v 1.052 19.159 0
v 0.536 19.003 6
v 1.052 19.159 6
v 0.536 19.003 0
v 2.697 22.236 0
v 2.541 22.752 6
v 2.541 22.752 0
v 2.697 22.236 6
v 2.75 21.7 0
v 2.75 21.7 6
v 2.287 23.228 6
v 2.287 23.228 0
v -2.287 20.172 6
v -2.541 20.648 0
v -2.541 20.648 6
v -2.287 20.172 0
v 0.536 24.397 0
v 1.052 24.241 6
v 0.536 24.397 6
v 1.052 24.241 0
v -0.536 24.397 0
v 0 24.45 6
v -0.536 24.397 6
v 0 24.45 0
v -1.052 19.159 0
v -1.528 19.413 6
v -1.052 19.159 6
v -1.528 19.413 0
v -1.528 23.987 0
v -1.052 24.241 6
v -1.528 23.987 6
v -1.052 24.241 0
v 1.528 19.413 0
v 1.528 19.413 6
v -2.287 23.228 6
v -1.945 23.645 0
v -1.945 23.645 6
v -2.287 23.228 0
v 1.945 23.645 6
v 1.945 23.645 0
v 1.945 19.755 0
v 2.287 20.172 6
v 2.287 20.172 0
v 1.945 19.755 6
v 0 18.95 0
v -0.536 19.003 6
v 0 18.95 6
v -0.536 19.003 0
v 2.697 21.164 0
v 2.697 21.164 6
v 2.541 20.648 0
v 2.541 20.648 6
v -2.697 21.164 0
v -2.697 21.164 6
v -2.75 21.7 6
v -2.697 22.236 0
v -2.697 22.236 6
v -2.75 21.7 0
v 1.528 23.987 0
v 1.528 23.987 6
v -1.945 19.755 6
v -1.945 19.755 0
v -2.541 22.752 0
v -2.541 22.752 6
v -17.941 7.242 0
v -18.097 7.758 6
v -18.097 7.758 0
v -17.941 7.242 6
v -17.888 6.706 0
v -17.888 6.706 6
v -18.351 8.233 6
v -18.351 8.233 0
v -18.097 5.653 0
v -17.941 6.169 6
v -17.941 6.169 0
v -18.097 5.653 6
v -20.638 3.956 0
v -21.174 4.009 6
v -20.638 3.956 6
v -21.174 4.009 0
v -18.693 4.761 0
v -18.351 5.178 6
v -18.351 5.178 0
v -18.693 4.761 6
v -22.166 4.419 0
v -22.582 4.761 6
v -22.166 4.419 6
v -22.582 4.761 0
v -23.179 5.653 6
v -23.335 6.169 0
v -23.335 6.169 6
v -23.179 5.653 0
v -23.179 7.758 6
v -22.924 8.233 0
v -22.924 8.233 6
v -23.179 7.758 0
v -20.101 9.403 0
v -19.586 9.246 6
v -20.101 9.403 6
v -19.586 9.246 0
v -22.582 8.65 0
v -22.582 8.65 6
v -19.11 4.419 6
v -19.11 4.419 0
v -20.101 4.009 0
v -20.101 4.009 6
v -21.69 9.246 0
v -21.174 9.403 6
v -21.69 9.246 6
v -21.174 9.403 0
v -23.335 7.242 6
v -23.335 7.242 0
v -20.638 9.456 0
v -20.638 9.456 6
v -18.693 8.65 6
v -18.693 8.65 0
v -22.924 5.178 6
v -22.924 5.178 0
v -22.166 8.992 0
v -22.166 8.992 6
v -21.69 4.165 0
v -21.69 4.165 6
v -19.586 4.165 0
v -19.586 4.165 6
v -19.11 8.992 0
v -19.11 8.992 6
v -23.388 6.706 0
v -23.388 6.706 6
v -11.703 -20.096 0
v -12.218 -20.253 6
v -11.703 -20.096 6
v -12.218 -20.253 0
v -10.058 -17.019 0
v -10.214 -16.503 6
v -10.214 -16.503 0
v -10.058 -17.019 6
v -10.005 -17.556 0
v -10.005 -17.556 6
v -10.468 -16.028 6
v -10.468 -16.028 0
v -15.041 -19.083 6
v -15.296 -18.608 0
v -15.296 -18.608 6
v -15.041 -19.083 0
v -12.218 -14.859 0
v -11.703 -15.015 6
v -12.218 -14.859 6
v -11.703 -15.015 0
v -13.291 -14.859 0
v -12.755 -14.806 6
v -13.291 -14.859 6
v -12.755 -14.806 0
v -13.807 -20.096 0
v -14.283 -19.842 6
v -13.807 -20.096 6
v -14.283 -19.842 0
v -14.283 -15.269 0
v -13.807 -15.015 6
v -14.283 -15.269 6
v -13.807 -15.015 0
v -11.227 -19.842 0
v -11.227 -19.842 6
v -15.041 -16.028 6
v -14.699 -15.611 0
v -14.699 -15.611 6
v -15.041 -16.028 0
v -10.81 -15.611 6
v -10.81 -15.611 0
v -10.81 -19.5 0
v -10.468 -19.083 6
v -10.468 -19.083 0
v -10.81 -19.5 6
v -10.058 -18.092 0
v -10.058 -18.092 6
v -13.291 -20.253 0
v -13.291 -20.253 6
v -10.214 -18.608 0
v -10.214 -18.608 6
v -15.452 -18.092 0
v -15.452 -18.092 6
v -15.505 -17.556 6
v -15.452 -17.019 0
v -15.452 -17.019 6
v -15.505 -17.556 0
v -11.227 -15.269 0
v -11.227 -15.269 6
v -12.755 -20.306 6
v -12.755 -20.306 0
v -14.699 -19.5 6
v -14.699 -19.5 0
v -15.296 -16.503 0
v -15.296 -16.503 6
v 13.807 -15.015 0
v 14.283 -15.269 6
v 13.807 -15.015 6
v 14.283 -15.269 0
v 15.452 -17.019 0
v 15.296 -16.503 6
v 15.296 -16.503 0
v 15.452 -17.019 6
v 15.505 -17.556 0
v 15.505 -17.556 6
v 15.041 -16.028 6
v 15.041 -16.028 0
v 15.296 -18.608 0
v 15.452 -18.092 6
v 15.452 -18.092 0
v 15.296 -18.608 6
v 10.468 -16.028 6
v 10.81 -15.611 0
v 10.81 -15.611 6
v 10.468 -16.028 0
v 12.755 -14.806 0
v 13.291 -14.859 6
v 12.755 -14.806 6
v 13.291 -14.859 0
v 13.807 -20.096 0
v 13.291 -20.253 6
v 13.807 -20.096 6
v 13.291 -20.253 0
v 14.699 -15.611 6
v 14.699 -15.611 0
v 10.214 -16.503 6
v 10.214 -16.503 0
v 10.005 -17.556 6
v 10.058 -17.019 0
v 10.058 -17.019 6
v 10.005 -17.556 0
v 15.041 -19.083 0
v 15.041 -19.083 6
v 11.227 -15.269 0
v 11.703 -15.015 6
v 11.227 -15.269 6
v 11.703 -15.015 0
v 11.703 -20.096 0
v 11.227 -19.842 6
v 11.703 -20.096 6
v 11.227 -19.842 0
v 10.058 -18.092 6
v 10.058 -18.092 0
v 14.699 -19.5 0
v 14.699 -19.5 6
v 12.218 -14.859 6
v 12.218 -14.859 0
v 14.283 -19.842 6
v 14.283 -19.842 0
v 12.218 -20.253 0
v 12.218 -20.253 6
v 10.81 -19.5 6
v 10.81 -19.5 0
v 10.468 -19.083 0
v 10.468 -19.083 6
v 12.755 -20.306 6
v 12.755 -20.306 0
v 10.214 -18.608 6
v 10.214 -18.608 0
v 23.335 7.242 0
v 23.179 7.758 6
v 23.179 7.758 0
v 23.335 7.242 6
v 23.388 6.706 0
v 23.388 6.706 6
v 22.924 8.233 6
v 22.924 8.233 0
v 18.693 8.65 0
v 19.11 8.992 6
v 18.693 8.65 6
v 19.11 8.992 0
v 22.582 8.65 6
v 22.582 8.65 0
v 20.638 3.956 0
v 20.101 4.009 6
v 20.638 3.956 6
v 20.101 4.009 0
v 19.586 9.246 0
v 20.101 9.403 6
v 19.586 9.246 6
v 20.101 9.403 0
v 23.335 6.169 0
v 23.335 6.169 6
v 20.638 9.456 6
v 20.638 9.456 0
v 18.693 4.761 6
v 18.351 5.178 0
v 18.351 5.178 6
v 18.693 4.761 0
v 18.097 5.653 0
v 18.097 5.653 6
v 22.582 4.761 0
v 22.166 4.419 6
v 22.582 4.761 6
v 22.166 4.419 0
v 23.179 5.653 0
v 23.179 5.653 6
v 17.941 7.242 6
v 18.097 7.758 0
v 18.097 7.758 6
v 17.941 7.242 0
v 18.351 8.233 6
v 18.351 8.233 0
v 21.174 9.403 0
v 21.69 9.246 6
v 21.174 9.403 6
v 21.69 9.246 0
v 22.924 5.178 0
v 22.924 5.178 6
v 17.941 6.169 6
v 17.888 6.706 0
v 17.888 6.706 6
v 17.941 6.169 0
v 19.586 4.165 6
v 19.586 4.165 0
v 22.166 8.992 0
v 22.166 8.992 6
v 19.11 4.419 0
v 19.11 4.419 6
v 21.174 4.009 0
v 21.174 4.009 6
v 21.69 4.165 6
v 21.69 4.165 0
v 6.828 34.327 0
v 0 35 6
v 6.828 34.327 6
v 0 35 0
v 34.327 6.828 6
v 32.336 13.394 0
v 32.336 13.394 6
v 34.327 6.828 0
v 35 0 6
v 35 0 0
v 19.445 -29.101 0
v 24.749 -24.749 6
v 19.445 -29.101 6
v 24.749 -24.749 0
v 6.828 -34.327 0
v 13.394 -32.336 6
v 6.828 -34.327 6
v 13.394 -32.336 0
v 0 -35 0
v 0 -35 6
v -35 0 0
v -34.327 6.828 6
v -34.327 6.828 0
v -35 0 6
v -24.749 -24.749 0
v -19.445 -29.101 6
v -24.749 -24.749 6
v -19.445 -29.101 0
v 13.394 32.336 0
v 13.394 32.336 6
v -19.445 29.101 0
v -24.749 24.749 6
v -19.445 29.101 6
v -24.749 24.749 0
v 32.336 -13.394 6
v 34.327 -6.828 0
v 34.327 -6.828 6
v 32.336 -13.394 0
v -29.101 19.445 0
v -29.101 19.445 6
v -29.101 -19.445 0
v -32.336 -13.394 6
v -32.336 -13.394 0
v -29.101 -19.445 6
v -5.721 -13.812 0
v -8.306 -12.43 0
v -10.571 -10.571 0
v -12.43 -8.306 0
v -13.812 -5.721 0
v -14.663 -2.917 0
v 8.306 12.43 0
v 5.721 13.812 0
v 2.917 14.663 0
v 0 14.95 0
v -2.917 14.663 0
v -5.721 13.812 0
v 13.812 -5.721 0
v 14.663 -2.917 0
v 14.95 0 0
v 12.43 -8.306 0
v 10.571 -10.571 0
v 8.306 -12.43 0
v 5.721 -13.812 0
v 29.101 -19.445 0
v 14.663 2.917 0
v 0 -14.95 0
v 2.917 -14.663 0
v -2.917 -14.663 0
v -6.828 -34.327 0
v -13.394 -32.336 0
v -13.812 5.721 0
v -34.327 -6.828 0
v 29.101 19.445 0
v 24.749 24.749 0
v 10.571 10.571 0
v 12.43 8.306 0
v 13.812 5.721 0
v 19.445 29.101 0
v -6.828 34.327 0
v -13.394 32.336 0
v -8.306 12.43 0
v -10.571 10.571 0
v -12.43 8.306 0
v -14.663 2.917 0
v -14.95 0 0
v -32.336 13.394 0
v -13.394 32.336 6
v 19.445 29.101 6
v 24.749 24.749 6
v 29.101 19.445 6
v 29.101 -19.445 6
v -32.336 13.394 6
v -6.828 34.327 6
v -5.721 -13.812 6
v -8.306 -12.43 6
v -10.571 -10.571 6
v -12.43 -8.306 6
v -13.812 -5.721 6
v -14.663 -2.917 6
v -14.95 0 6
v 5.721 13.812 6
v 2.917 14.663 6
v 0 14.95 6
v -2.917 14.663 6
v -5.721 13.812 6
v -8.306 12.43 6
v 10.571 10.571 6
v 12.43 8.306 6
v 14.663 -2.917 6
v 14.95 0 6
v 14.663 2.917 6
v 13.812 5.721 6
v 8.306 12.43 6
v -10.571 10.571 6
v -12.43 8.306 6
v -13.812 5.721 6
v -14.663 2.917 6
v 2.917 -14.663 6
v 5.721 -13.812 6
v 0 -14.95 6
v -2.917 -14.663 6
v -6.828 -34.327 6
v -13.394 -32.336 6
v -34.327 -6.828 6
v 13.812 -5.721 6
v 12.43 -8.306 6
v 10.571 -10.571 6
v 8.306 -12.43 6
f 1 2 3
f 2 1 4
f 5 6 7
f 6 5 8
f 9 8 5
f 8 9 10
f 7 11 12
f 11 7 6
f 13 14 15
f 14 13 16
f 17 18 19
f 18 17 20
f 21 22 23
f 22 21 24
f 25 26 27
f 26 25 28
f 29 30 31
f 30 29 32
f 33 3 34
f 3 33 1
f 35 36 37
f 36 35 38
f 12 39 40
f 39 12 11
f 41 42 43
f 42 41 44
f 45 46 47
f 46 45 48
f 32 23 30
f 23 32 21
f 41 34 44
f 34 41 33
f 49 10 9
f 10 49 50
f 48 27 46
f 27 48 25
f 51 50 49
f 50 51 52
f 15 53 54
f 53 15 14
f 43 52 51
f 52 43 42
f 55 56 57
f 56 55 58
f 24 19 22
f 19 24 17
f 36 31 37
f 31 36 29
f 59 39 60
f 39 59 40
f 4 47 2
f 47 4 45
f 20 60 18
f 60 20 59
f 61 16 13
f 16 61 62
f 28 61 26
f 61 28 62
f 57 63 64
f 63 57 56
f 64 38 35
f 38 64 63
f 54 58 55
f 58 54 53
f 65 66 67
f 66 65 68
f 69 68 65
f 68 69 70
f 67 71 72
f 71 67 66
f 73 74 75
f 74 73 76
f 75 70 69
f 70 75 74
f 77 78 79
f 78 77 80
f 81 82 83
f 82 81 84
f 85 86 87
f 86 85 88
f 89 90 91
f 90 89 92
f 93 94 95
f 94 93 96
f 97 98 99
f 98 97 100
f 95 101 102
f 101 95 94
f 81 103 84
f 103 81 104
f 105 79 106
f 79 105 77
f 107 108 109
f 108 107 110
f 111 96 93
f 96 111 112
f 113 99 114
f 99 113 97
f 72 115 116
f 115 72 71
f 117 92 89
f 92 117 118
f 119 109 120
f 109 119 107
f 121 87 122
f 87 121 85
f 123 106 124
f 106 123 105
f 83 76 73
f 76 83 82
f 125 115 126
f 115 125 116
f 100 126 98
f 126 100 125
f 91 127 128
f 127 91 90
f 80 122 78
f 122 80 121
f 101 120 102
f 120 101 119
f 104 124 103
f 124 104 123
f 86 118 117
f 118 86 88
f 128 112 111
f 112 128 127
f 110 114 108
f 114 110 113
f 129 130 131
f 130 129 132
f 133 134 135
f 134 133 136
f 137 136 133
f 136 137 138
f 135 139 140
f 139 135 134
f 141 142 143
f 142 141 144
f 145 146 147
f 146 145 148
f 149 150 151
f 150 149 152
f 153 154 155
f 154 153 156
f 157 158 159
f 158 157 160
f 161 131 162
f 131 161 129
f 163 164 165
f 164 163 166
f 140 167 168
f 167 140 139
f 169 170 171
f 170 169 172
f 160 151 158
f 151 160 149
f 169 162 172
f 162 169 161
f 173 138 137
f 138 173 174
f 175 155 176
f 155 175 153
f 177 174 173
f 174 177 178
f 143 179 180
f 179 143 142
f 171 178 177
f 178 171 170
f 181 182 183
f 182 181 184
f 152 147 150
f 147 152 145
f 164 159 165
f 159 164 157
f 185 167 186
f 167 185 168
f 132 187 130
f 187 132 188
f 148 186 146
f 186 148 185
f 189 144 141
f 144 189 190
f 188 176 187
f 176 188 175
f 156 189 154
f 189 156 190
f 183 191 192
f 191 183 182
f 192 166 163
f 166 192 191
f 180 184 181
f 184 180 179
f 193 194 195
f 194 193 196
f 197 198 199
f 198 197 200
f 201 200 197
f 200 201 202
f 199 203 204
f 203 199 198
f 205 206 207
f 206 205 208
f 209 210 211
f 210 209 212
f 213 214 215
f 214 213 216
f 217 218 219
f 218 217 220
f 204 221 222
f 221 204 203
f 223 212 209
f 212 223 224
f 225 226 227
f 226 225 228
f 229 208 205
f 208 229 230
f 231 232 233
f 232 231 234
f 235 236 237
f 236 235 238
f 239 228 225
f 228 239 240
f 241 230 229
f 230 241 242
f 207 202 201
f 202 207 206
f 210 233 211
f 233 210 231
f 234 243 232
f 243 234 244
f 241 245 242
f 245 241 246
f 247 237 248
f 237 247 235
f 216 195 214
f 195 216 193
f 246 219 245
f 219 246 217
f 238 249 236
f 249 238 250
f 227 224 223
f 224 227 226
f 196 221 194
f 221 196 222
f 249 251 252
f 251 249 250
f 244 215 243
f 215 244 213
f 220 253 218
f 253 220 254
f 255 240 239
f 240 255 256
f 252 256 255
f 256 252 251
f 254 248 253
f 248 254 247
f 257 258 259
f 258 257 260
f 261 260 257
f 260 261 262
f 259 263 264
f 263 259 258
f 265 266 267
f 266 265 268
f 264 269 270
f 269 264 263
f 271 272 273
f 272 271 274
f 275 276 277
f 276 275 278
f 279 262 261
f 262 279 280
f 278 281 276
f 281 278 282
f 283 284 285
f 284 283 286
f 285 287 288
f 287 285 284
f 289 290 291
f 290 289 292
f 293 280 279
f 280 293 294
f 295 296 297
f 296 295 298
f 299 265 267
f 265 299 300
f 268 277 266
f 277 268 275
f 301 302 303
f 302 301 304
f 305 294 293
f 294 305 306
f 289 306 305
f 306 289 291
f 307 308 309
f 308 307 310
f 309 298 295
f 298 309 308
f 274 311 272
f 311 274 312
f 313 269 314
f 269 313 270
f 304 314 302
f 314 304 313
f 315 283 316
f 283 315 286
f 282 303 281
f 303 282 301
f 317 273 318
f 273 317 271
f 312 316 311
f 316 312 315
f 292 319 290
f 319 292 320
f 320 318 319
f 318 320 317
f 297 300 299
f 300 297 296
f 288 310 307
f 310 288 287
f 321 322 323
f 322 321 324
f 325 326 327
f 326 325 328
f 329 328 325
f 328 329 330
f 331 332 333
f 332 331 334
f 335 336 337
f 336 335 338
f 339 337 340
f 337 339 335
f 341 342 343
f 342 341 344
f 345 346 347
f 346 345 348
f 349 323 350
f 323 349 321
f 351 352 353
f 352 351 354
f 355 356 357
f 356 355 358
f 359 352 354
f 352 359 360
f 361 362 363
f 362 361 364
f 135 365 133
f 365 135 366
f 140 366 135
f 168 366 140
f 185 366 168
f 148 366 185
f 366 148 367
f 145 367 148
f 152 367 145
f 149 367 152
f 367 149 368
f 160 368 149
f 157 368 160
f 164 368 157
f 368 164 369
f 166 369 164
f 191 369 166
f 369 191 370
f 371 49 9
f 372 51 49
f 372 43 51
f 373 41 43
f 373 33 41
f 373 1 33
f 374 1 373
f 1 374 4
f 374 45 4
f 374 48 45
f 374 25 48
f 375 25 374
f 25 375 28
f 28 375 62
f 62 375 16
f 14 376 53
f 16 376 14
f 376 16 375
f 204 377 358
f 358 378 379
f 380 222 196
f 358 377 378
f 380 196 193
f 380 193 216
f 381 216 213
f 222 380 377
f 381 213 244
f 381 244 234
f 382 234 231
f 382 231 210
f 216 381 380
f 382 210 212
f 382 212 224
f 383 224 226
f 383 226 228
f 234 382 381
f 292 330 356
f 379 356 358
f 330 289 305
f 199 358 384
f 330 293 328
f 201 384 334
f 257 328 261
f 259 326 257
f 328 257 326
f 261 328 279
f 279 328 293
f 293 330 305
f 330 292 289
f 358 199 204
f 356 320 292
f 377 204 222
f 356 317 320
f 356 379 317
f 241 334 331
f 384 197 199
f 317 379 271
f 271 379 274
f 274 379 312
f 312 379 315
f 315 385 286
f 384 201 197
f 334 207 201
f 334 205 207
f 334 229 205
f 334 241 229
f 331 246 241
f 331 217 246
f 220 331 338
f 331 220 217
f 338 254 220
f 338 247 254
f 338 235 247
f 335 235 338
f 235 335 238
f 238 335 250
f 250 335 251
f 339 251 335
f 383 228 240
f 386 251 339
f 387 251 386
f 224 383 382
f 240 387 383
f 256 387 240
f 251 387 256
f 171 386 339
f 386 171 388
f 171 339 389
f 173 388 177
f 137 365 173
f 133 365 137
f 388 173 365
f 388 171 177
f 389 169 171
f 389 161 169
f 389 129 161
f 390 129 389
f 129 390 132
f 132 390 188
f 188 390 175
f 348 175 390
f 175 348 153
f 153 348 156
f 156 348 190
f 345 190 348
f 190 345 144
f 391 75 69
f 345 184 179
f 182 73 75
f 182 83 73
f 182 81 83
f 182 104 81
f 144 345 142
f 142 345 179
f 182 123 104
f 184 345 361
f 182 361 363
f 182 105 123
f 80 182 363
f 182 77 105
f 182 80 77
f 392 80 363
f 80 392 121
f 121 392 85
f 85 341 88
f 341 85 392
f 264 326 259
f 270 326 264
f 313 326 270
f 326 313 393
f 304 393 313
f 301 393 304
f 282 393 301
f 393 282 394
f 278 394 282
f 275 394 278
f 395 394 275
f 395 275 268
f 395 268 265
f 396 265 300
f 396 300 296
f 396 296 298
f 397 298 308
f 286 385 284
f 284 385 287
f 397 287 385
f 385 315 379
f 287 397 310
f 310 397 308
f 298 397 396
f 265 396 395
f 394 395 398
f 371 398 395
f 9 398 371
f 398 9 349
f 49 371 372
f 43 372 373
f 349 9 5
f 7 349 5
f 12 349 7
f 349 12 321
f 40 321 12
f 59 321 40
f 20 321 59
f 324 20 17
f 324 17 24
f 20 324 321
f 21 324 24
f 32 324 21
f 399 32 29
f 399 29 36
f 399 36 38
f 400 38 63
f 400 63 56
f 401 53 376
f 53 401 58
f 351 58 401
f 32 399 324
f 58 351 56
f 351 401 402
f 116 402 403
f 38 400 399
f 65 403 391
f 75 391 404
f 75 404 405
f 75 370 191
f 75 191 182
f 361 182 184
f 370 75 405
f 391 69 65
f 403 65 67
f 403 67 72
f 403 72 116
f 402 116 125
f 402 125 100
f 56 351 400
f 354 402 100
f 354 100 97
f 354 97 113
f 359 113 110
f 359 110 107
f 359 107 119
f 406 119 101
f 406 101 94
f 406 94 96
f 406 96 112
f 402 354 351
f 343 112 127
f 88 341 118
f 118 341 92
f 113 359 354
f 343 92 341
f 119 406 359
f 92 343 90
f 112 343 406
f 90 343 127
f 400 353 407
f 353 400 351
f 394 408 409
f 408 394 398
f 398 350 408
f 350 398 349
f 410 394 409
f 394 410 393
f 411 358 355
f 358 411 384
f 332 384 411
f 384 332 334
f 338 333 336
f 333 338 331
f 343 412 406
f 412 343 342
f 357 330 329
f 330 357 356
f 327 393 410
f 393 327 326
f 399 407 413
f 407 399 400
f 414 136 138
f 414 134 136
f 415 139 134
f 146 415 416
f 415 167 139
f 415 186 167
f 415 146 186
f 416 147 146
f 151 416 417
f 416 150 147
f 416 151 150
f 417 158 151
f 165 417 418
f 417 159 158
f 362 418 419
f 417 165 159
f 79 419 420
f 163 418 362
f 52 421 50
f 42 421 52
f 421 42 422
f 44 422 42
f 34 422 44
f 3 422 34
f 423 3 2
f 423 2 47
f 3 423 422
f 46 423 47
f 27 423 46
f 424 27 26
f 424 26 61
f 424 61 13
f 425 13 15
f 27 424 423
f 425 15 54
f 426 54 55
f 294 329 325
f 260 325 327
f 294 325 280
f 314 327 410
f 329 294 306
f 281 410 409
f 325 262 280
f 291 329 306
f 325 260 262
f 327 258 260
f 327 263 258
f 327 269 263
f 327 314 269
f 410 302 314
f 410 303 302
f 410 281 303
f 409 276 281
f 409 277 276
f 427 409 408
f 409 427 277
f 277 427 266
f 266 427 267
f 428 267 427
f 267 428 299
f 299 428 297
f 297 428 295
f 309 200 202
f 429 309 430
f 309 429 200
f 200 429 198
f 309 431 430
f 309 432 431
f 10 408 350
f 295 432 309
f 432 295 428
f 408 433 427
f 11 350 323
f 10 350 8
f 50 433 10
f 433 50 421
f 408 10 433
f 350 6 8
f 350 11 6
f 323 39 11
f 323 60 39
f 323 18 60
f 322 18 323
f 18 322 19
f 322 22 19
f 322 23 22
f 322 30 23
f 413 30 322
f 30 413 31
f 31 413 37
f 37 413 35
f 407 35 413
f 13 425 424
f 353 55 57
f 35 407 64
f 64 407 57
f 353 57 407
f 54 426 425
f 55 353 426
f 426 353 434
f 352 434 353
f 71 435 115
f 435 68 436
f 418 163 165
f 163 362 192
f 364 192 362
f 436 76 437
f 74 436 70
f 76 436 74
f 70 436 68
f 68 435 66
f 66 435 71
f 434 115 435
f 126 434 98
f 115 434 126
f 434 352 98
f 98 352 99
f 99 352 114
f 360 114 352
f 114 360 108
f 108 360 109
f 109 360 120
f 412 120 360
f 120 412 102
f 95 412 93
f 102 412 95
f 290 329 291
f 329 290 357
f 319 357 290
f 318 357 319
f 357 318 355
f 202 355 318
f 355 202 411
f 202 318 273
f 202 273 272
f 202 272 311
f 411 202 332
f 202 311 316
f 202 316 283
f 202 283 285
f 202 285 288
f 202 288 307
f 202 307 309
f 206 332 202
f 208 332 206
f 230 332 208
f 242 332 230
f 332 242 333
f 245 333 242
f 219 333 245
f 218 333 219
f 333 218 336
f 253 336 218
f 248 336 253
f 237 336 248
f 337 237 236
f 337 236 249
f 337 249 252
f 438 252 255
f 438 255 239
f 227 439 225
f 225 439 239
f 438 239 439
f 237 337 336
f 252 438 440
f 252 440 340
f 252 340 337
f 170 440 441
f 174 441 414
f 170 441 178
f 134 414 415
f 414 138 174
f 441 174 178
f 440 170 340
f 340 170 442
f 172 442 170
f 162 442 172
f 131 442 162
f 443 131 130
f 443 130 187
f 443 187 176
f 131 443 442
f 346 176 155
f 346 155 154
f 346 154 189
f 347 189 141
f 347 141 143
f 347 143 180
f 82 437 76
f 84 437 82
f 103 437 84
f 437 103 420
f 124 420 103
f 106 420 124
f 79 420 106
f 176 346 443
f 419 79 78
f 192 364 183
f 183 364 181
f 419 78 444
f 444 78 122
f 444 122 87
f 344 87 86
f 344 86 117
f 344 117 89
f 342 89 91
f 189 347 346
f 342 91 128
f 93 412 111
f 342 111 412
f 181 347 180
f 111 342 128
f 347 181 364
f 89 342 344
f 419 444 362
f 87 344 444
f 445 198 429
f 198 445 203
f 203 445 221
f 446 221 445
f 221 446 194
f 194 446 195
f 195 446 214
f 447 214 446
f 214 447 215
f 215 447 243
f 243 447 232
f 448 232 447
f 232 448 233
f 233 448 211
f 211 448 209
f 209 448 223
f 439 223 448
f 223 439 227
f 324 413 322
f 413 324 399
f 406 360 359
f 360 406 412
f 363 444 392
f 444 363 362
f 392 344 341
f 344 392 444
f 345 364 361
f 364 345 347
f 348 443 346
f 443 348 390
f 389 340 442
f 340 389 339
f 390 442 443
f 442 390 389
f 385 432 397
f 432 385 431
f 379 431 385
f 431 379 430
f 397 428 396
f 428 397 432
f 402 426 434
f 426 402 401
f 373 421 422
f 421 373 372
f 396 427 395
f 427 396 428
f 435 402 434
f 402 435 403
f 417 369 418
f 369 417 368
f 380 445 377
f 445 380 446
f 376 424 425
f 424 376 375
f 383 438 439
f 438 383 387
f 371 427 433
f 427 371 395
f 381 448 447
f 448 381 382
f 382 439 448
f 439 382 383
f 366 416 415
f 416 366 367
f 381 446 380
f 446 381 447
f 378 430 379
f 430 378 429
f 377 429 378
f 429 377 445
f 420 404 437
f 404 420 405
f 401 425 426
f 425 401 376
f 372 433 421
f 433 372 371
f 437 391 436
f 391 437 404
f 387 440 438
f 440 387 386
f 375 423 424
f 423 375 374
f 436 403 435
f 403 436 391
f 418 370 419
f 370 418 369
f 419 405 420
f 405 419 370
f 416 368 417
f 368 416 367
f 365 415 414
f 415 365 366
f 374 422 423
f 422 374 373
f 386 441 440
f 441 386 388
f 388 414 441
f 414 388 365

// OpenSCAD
$fn = 32;

// ----------------------------------------------------------------------
// Flange Ø70 x 6
// 5 holes on a Ø43.4 bolt circle, bolted joints
// ----------------------------------------------------------------------

// --- parameters (mm) ---
flange_d = 70;   // outside diameter of the flange
thickness = 6;   // flange thickness
holes = 5;       // number of bolt holes
pcd = 43.4;      // bolt circle diameter
start_deg = 90;  // angle of the first hole, from +X
hole_d = 5.5;    // bolt hole diameter
bore_d = 29.9;   // central through bore
hub_d = 37.9;    // hub outside diameter
hub_h = 0;       // hub height above the flange face (0 = no hub)

// --- derived feature positions (mm) ---
height = thickness + hub_h;  // = 6   overall height of the part
pcd_r = pcd / 2;             // = 21.7   bolt circle radius
hole_step = 360 / holes;     // = 72   angular pitch
feature_centers = [
  [pcd_r * cos(start_deg + 0 * hole_step), pcd_r * sin(start_deg + 0 * hole_step)],
  [pcd_r * cos(start_deg + 1 * hole_step), pcd_r * sin(start_deg + 1 * hole_step)],
  [pcd_r * cos(start_deg + 2 * hole_step), pcd_r * sin(start_deg + 2 * hole_step)],
  [pcd_r * cos(start_deg + 3 * hole_step), pcd_r * sin(start_deg + 3 * hole_step)],
  [pcd_r * cos(start_deg + 4 * hole_step), pcd_r * sin(start_deg + 4 * hole_step)]
];   // bolt hole centres on the pitch circle

// flange disc, every hole and the bore cut straight through
difference() {
  union() {
    cylinder(d = flange_d, h = thickness);
  }
  translate([0, 0, -1]) cylinder(d = bore_d, h = height + 2);  // bore, through
  for (centre = feature_centers)
    translate([centre[0], centre[1], -1]) cylinder(d = hole_d, h = thickness + 2);
}
